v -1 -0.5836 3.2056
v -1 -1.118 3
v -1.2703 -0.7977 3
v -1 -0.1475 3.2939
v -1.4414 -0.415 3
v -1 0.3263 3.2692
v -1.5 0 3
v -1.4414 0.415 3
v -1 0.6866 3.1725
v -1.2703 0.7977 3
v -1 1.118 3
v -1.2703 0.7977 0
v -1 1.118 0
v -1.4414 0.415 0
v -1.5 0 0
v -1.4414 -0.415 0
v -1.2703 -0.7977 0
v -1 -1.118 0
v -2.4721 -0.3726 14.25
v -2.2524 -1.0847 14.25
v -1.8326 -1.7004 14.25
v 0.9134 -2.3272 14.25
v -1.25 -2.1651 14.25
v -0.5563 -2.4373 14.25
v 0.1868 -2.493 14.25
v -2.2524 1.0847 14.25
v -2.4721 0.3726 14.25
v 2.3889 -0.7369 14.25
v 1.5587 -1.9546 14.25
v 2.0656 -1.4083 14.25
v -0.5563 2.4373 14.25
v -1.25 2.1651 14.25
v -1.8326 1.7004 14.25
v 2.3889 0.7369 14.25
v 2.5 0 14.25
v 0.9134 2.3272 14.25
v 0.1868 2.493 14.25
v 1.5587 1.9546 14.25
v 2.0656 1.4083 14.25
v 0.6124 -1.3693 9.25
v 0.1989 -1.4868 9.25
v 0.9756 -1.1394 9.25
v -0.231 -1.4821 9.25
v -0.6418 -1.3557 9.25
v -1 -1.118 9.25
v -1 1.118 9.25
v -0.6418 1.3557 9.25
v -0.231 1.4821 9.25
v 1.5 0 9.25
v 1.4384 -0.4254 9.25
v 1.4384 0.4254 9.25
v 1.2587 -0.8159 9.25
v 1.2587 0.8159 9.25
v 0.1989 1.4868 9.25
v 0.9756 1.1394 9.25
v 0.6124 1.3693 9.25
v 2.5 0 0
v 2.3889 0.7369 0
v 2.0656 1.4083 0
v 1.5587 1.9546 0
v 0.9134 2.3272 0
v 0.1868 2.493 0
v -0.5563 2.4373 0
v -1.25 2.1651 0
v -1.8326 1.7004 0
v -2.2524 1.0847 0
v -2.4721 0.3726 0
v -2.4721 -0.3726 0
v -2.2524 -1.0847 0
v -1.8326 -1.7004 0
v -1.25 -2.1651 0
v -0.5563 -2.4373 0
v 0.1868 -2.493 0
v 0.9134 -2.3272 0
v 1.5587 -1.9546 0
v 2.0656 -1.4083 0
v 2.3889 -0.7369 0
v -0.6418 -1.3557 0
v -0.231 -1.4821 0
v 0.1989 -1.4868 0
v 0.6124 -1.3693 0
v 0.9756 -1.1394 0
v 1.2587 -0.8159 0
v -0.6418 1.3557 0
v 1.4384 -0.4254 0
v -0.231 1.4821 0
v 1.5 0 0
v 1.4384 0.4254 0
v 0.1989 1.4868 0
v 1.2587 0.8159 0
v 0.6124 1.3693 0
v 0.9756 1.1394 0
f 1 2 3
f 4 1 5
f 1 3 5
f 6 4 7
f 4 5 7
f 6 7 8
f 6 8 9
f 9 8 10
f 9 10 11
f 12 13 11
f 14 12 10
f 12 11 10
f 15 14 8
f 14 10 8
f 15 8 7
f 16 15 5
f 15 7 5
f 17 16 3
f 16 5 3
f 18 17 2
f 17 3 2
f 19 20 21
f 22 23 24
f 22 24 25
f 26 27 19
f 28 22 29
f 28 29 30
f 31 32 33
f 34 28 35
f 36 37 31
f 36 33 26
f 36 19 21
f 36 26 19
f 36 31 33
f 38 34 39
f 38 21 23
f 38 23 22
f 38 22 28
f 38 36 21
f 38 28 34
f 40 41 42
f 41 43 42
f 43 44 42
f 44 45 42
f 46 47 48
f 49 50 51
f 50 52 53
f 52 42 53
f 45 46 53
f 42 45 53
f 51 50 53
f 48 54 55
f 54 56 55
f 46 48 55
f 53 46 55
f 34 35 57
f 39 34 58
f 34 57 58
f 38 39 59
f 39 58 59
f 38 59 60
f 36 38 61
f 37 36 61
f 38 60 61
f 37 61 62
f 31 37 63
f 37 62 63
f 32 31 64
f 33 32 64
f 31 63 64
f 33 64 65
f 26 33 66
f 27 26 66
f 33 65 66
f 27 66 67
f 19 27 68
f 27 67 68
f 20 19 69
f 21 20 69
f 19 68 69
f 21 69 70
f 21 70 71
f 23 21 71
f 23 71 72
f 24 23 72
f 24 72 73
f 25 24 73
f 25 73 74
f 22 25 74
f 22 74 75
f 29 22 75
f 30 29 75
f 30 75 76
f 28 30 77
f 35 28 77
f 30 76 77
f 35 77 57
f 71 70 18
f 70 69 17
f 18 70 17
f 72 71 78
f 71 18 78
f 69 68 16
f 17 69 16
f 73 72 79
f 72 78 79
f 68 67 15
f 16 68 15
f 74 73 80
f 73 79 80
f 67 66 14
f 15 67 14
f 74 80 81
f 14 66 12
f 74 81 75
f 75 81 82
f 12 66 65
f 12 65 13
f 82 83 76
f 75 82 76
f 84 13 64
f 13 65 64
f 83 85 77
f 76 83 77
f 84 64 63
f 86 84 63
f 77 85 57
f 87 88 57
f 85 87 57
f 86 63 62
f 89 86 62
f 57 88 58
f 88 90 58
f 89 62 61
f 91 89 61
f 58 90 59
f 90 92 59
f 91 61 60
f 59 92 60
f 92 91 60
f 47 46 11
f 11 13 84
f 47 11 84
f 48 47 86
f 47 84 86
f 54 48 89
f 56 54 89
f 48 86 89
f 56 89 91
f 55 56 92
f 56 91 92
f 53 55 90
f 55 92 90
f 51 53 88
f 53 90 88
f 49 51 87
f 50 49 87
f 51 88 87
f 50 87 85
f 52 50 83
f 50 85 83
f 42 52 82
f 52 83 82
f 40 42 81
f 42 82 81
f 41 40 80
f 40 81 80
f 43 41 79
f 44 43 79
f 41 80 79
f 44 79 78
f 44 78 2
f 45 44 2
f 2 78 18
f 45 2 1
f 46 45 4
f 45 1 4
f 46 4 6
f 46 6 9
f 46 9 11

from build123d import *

# Parameters (mm, degrees)
F0_R     = 2.5
F1_DEPTH = 14.25
F3_D     = 3
F3_DEPTH = 3
F3_TIP   = 0.9012909285
F4_R     = 2.1505871319
F5_DEPTH = 5


with BuildPart() as f1:
    # F0 (on Top) → F1 (new body)
    with BuildSketch(Plane.XY):
        Circle(F0_R)
        with BuildLine():
            ThreePointArc((-1, 1.1180339887), (1.5, 0), (-1, -1.1180339887))
            Line((-1, -1.1180339887), (-1, 1.1180339887))
        make_face(mode=Mode.SUBTRACT)
    extrude(amount=F1_DEPTH)

    # F3
    with Locations(Plane(origin=(0, 0, 0), x_dir=(1, 0, 0), z_dir=(0, 0, -1))):
        with Locations((0, 0)):
            Hole(F3_D / 2, depth=F3_DEPTH)
            with Locations((0, 0, -(F3_DEPTH + F3_TIP / 2))):  # 118° drill point
                Cone(0, F3_D / 2, F3_TIP, mode=Mode.SUBTRACT)

    # F4 (on face) → F5 (join)
    with BuildSketch(Plane.XY.offset(14.25)):
        Circle(F4_R)
        with BuildLine():
            ThreePointArc((-1, 1.1180339887), (1.5, 0), (-1, -1.1180339887))
            Line((-1, -1.1180339887), (-1, 1.1180339887))
        make_face(mode=Mode.SUBTRACT)
        with BuildLine():
            Line((-1, 1.1180339887), (-1, -1.1180339887))
            ThreePointArc((-1, -1.1180339887), (1.5, 0), (-1, 1.1180339887))
        make_face()
    extrude(amount=-F5_DEPTH)


solid = f1.part
